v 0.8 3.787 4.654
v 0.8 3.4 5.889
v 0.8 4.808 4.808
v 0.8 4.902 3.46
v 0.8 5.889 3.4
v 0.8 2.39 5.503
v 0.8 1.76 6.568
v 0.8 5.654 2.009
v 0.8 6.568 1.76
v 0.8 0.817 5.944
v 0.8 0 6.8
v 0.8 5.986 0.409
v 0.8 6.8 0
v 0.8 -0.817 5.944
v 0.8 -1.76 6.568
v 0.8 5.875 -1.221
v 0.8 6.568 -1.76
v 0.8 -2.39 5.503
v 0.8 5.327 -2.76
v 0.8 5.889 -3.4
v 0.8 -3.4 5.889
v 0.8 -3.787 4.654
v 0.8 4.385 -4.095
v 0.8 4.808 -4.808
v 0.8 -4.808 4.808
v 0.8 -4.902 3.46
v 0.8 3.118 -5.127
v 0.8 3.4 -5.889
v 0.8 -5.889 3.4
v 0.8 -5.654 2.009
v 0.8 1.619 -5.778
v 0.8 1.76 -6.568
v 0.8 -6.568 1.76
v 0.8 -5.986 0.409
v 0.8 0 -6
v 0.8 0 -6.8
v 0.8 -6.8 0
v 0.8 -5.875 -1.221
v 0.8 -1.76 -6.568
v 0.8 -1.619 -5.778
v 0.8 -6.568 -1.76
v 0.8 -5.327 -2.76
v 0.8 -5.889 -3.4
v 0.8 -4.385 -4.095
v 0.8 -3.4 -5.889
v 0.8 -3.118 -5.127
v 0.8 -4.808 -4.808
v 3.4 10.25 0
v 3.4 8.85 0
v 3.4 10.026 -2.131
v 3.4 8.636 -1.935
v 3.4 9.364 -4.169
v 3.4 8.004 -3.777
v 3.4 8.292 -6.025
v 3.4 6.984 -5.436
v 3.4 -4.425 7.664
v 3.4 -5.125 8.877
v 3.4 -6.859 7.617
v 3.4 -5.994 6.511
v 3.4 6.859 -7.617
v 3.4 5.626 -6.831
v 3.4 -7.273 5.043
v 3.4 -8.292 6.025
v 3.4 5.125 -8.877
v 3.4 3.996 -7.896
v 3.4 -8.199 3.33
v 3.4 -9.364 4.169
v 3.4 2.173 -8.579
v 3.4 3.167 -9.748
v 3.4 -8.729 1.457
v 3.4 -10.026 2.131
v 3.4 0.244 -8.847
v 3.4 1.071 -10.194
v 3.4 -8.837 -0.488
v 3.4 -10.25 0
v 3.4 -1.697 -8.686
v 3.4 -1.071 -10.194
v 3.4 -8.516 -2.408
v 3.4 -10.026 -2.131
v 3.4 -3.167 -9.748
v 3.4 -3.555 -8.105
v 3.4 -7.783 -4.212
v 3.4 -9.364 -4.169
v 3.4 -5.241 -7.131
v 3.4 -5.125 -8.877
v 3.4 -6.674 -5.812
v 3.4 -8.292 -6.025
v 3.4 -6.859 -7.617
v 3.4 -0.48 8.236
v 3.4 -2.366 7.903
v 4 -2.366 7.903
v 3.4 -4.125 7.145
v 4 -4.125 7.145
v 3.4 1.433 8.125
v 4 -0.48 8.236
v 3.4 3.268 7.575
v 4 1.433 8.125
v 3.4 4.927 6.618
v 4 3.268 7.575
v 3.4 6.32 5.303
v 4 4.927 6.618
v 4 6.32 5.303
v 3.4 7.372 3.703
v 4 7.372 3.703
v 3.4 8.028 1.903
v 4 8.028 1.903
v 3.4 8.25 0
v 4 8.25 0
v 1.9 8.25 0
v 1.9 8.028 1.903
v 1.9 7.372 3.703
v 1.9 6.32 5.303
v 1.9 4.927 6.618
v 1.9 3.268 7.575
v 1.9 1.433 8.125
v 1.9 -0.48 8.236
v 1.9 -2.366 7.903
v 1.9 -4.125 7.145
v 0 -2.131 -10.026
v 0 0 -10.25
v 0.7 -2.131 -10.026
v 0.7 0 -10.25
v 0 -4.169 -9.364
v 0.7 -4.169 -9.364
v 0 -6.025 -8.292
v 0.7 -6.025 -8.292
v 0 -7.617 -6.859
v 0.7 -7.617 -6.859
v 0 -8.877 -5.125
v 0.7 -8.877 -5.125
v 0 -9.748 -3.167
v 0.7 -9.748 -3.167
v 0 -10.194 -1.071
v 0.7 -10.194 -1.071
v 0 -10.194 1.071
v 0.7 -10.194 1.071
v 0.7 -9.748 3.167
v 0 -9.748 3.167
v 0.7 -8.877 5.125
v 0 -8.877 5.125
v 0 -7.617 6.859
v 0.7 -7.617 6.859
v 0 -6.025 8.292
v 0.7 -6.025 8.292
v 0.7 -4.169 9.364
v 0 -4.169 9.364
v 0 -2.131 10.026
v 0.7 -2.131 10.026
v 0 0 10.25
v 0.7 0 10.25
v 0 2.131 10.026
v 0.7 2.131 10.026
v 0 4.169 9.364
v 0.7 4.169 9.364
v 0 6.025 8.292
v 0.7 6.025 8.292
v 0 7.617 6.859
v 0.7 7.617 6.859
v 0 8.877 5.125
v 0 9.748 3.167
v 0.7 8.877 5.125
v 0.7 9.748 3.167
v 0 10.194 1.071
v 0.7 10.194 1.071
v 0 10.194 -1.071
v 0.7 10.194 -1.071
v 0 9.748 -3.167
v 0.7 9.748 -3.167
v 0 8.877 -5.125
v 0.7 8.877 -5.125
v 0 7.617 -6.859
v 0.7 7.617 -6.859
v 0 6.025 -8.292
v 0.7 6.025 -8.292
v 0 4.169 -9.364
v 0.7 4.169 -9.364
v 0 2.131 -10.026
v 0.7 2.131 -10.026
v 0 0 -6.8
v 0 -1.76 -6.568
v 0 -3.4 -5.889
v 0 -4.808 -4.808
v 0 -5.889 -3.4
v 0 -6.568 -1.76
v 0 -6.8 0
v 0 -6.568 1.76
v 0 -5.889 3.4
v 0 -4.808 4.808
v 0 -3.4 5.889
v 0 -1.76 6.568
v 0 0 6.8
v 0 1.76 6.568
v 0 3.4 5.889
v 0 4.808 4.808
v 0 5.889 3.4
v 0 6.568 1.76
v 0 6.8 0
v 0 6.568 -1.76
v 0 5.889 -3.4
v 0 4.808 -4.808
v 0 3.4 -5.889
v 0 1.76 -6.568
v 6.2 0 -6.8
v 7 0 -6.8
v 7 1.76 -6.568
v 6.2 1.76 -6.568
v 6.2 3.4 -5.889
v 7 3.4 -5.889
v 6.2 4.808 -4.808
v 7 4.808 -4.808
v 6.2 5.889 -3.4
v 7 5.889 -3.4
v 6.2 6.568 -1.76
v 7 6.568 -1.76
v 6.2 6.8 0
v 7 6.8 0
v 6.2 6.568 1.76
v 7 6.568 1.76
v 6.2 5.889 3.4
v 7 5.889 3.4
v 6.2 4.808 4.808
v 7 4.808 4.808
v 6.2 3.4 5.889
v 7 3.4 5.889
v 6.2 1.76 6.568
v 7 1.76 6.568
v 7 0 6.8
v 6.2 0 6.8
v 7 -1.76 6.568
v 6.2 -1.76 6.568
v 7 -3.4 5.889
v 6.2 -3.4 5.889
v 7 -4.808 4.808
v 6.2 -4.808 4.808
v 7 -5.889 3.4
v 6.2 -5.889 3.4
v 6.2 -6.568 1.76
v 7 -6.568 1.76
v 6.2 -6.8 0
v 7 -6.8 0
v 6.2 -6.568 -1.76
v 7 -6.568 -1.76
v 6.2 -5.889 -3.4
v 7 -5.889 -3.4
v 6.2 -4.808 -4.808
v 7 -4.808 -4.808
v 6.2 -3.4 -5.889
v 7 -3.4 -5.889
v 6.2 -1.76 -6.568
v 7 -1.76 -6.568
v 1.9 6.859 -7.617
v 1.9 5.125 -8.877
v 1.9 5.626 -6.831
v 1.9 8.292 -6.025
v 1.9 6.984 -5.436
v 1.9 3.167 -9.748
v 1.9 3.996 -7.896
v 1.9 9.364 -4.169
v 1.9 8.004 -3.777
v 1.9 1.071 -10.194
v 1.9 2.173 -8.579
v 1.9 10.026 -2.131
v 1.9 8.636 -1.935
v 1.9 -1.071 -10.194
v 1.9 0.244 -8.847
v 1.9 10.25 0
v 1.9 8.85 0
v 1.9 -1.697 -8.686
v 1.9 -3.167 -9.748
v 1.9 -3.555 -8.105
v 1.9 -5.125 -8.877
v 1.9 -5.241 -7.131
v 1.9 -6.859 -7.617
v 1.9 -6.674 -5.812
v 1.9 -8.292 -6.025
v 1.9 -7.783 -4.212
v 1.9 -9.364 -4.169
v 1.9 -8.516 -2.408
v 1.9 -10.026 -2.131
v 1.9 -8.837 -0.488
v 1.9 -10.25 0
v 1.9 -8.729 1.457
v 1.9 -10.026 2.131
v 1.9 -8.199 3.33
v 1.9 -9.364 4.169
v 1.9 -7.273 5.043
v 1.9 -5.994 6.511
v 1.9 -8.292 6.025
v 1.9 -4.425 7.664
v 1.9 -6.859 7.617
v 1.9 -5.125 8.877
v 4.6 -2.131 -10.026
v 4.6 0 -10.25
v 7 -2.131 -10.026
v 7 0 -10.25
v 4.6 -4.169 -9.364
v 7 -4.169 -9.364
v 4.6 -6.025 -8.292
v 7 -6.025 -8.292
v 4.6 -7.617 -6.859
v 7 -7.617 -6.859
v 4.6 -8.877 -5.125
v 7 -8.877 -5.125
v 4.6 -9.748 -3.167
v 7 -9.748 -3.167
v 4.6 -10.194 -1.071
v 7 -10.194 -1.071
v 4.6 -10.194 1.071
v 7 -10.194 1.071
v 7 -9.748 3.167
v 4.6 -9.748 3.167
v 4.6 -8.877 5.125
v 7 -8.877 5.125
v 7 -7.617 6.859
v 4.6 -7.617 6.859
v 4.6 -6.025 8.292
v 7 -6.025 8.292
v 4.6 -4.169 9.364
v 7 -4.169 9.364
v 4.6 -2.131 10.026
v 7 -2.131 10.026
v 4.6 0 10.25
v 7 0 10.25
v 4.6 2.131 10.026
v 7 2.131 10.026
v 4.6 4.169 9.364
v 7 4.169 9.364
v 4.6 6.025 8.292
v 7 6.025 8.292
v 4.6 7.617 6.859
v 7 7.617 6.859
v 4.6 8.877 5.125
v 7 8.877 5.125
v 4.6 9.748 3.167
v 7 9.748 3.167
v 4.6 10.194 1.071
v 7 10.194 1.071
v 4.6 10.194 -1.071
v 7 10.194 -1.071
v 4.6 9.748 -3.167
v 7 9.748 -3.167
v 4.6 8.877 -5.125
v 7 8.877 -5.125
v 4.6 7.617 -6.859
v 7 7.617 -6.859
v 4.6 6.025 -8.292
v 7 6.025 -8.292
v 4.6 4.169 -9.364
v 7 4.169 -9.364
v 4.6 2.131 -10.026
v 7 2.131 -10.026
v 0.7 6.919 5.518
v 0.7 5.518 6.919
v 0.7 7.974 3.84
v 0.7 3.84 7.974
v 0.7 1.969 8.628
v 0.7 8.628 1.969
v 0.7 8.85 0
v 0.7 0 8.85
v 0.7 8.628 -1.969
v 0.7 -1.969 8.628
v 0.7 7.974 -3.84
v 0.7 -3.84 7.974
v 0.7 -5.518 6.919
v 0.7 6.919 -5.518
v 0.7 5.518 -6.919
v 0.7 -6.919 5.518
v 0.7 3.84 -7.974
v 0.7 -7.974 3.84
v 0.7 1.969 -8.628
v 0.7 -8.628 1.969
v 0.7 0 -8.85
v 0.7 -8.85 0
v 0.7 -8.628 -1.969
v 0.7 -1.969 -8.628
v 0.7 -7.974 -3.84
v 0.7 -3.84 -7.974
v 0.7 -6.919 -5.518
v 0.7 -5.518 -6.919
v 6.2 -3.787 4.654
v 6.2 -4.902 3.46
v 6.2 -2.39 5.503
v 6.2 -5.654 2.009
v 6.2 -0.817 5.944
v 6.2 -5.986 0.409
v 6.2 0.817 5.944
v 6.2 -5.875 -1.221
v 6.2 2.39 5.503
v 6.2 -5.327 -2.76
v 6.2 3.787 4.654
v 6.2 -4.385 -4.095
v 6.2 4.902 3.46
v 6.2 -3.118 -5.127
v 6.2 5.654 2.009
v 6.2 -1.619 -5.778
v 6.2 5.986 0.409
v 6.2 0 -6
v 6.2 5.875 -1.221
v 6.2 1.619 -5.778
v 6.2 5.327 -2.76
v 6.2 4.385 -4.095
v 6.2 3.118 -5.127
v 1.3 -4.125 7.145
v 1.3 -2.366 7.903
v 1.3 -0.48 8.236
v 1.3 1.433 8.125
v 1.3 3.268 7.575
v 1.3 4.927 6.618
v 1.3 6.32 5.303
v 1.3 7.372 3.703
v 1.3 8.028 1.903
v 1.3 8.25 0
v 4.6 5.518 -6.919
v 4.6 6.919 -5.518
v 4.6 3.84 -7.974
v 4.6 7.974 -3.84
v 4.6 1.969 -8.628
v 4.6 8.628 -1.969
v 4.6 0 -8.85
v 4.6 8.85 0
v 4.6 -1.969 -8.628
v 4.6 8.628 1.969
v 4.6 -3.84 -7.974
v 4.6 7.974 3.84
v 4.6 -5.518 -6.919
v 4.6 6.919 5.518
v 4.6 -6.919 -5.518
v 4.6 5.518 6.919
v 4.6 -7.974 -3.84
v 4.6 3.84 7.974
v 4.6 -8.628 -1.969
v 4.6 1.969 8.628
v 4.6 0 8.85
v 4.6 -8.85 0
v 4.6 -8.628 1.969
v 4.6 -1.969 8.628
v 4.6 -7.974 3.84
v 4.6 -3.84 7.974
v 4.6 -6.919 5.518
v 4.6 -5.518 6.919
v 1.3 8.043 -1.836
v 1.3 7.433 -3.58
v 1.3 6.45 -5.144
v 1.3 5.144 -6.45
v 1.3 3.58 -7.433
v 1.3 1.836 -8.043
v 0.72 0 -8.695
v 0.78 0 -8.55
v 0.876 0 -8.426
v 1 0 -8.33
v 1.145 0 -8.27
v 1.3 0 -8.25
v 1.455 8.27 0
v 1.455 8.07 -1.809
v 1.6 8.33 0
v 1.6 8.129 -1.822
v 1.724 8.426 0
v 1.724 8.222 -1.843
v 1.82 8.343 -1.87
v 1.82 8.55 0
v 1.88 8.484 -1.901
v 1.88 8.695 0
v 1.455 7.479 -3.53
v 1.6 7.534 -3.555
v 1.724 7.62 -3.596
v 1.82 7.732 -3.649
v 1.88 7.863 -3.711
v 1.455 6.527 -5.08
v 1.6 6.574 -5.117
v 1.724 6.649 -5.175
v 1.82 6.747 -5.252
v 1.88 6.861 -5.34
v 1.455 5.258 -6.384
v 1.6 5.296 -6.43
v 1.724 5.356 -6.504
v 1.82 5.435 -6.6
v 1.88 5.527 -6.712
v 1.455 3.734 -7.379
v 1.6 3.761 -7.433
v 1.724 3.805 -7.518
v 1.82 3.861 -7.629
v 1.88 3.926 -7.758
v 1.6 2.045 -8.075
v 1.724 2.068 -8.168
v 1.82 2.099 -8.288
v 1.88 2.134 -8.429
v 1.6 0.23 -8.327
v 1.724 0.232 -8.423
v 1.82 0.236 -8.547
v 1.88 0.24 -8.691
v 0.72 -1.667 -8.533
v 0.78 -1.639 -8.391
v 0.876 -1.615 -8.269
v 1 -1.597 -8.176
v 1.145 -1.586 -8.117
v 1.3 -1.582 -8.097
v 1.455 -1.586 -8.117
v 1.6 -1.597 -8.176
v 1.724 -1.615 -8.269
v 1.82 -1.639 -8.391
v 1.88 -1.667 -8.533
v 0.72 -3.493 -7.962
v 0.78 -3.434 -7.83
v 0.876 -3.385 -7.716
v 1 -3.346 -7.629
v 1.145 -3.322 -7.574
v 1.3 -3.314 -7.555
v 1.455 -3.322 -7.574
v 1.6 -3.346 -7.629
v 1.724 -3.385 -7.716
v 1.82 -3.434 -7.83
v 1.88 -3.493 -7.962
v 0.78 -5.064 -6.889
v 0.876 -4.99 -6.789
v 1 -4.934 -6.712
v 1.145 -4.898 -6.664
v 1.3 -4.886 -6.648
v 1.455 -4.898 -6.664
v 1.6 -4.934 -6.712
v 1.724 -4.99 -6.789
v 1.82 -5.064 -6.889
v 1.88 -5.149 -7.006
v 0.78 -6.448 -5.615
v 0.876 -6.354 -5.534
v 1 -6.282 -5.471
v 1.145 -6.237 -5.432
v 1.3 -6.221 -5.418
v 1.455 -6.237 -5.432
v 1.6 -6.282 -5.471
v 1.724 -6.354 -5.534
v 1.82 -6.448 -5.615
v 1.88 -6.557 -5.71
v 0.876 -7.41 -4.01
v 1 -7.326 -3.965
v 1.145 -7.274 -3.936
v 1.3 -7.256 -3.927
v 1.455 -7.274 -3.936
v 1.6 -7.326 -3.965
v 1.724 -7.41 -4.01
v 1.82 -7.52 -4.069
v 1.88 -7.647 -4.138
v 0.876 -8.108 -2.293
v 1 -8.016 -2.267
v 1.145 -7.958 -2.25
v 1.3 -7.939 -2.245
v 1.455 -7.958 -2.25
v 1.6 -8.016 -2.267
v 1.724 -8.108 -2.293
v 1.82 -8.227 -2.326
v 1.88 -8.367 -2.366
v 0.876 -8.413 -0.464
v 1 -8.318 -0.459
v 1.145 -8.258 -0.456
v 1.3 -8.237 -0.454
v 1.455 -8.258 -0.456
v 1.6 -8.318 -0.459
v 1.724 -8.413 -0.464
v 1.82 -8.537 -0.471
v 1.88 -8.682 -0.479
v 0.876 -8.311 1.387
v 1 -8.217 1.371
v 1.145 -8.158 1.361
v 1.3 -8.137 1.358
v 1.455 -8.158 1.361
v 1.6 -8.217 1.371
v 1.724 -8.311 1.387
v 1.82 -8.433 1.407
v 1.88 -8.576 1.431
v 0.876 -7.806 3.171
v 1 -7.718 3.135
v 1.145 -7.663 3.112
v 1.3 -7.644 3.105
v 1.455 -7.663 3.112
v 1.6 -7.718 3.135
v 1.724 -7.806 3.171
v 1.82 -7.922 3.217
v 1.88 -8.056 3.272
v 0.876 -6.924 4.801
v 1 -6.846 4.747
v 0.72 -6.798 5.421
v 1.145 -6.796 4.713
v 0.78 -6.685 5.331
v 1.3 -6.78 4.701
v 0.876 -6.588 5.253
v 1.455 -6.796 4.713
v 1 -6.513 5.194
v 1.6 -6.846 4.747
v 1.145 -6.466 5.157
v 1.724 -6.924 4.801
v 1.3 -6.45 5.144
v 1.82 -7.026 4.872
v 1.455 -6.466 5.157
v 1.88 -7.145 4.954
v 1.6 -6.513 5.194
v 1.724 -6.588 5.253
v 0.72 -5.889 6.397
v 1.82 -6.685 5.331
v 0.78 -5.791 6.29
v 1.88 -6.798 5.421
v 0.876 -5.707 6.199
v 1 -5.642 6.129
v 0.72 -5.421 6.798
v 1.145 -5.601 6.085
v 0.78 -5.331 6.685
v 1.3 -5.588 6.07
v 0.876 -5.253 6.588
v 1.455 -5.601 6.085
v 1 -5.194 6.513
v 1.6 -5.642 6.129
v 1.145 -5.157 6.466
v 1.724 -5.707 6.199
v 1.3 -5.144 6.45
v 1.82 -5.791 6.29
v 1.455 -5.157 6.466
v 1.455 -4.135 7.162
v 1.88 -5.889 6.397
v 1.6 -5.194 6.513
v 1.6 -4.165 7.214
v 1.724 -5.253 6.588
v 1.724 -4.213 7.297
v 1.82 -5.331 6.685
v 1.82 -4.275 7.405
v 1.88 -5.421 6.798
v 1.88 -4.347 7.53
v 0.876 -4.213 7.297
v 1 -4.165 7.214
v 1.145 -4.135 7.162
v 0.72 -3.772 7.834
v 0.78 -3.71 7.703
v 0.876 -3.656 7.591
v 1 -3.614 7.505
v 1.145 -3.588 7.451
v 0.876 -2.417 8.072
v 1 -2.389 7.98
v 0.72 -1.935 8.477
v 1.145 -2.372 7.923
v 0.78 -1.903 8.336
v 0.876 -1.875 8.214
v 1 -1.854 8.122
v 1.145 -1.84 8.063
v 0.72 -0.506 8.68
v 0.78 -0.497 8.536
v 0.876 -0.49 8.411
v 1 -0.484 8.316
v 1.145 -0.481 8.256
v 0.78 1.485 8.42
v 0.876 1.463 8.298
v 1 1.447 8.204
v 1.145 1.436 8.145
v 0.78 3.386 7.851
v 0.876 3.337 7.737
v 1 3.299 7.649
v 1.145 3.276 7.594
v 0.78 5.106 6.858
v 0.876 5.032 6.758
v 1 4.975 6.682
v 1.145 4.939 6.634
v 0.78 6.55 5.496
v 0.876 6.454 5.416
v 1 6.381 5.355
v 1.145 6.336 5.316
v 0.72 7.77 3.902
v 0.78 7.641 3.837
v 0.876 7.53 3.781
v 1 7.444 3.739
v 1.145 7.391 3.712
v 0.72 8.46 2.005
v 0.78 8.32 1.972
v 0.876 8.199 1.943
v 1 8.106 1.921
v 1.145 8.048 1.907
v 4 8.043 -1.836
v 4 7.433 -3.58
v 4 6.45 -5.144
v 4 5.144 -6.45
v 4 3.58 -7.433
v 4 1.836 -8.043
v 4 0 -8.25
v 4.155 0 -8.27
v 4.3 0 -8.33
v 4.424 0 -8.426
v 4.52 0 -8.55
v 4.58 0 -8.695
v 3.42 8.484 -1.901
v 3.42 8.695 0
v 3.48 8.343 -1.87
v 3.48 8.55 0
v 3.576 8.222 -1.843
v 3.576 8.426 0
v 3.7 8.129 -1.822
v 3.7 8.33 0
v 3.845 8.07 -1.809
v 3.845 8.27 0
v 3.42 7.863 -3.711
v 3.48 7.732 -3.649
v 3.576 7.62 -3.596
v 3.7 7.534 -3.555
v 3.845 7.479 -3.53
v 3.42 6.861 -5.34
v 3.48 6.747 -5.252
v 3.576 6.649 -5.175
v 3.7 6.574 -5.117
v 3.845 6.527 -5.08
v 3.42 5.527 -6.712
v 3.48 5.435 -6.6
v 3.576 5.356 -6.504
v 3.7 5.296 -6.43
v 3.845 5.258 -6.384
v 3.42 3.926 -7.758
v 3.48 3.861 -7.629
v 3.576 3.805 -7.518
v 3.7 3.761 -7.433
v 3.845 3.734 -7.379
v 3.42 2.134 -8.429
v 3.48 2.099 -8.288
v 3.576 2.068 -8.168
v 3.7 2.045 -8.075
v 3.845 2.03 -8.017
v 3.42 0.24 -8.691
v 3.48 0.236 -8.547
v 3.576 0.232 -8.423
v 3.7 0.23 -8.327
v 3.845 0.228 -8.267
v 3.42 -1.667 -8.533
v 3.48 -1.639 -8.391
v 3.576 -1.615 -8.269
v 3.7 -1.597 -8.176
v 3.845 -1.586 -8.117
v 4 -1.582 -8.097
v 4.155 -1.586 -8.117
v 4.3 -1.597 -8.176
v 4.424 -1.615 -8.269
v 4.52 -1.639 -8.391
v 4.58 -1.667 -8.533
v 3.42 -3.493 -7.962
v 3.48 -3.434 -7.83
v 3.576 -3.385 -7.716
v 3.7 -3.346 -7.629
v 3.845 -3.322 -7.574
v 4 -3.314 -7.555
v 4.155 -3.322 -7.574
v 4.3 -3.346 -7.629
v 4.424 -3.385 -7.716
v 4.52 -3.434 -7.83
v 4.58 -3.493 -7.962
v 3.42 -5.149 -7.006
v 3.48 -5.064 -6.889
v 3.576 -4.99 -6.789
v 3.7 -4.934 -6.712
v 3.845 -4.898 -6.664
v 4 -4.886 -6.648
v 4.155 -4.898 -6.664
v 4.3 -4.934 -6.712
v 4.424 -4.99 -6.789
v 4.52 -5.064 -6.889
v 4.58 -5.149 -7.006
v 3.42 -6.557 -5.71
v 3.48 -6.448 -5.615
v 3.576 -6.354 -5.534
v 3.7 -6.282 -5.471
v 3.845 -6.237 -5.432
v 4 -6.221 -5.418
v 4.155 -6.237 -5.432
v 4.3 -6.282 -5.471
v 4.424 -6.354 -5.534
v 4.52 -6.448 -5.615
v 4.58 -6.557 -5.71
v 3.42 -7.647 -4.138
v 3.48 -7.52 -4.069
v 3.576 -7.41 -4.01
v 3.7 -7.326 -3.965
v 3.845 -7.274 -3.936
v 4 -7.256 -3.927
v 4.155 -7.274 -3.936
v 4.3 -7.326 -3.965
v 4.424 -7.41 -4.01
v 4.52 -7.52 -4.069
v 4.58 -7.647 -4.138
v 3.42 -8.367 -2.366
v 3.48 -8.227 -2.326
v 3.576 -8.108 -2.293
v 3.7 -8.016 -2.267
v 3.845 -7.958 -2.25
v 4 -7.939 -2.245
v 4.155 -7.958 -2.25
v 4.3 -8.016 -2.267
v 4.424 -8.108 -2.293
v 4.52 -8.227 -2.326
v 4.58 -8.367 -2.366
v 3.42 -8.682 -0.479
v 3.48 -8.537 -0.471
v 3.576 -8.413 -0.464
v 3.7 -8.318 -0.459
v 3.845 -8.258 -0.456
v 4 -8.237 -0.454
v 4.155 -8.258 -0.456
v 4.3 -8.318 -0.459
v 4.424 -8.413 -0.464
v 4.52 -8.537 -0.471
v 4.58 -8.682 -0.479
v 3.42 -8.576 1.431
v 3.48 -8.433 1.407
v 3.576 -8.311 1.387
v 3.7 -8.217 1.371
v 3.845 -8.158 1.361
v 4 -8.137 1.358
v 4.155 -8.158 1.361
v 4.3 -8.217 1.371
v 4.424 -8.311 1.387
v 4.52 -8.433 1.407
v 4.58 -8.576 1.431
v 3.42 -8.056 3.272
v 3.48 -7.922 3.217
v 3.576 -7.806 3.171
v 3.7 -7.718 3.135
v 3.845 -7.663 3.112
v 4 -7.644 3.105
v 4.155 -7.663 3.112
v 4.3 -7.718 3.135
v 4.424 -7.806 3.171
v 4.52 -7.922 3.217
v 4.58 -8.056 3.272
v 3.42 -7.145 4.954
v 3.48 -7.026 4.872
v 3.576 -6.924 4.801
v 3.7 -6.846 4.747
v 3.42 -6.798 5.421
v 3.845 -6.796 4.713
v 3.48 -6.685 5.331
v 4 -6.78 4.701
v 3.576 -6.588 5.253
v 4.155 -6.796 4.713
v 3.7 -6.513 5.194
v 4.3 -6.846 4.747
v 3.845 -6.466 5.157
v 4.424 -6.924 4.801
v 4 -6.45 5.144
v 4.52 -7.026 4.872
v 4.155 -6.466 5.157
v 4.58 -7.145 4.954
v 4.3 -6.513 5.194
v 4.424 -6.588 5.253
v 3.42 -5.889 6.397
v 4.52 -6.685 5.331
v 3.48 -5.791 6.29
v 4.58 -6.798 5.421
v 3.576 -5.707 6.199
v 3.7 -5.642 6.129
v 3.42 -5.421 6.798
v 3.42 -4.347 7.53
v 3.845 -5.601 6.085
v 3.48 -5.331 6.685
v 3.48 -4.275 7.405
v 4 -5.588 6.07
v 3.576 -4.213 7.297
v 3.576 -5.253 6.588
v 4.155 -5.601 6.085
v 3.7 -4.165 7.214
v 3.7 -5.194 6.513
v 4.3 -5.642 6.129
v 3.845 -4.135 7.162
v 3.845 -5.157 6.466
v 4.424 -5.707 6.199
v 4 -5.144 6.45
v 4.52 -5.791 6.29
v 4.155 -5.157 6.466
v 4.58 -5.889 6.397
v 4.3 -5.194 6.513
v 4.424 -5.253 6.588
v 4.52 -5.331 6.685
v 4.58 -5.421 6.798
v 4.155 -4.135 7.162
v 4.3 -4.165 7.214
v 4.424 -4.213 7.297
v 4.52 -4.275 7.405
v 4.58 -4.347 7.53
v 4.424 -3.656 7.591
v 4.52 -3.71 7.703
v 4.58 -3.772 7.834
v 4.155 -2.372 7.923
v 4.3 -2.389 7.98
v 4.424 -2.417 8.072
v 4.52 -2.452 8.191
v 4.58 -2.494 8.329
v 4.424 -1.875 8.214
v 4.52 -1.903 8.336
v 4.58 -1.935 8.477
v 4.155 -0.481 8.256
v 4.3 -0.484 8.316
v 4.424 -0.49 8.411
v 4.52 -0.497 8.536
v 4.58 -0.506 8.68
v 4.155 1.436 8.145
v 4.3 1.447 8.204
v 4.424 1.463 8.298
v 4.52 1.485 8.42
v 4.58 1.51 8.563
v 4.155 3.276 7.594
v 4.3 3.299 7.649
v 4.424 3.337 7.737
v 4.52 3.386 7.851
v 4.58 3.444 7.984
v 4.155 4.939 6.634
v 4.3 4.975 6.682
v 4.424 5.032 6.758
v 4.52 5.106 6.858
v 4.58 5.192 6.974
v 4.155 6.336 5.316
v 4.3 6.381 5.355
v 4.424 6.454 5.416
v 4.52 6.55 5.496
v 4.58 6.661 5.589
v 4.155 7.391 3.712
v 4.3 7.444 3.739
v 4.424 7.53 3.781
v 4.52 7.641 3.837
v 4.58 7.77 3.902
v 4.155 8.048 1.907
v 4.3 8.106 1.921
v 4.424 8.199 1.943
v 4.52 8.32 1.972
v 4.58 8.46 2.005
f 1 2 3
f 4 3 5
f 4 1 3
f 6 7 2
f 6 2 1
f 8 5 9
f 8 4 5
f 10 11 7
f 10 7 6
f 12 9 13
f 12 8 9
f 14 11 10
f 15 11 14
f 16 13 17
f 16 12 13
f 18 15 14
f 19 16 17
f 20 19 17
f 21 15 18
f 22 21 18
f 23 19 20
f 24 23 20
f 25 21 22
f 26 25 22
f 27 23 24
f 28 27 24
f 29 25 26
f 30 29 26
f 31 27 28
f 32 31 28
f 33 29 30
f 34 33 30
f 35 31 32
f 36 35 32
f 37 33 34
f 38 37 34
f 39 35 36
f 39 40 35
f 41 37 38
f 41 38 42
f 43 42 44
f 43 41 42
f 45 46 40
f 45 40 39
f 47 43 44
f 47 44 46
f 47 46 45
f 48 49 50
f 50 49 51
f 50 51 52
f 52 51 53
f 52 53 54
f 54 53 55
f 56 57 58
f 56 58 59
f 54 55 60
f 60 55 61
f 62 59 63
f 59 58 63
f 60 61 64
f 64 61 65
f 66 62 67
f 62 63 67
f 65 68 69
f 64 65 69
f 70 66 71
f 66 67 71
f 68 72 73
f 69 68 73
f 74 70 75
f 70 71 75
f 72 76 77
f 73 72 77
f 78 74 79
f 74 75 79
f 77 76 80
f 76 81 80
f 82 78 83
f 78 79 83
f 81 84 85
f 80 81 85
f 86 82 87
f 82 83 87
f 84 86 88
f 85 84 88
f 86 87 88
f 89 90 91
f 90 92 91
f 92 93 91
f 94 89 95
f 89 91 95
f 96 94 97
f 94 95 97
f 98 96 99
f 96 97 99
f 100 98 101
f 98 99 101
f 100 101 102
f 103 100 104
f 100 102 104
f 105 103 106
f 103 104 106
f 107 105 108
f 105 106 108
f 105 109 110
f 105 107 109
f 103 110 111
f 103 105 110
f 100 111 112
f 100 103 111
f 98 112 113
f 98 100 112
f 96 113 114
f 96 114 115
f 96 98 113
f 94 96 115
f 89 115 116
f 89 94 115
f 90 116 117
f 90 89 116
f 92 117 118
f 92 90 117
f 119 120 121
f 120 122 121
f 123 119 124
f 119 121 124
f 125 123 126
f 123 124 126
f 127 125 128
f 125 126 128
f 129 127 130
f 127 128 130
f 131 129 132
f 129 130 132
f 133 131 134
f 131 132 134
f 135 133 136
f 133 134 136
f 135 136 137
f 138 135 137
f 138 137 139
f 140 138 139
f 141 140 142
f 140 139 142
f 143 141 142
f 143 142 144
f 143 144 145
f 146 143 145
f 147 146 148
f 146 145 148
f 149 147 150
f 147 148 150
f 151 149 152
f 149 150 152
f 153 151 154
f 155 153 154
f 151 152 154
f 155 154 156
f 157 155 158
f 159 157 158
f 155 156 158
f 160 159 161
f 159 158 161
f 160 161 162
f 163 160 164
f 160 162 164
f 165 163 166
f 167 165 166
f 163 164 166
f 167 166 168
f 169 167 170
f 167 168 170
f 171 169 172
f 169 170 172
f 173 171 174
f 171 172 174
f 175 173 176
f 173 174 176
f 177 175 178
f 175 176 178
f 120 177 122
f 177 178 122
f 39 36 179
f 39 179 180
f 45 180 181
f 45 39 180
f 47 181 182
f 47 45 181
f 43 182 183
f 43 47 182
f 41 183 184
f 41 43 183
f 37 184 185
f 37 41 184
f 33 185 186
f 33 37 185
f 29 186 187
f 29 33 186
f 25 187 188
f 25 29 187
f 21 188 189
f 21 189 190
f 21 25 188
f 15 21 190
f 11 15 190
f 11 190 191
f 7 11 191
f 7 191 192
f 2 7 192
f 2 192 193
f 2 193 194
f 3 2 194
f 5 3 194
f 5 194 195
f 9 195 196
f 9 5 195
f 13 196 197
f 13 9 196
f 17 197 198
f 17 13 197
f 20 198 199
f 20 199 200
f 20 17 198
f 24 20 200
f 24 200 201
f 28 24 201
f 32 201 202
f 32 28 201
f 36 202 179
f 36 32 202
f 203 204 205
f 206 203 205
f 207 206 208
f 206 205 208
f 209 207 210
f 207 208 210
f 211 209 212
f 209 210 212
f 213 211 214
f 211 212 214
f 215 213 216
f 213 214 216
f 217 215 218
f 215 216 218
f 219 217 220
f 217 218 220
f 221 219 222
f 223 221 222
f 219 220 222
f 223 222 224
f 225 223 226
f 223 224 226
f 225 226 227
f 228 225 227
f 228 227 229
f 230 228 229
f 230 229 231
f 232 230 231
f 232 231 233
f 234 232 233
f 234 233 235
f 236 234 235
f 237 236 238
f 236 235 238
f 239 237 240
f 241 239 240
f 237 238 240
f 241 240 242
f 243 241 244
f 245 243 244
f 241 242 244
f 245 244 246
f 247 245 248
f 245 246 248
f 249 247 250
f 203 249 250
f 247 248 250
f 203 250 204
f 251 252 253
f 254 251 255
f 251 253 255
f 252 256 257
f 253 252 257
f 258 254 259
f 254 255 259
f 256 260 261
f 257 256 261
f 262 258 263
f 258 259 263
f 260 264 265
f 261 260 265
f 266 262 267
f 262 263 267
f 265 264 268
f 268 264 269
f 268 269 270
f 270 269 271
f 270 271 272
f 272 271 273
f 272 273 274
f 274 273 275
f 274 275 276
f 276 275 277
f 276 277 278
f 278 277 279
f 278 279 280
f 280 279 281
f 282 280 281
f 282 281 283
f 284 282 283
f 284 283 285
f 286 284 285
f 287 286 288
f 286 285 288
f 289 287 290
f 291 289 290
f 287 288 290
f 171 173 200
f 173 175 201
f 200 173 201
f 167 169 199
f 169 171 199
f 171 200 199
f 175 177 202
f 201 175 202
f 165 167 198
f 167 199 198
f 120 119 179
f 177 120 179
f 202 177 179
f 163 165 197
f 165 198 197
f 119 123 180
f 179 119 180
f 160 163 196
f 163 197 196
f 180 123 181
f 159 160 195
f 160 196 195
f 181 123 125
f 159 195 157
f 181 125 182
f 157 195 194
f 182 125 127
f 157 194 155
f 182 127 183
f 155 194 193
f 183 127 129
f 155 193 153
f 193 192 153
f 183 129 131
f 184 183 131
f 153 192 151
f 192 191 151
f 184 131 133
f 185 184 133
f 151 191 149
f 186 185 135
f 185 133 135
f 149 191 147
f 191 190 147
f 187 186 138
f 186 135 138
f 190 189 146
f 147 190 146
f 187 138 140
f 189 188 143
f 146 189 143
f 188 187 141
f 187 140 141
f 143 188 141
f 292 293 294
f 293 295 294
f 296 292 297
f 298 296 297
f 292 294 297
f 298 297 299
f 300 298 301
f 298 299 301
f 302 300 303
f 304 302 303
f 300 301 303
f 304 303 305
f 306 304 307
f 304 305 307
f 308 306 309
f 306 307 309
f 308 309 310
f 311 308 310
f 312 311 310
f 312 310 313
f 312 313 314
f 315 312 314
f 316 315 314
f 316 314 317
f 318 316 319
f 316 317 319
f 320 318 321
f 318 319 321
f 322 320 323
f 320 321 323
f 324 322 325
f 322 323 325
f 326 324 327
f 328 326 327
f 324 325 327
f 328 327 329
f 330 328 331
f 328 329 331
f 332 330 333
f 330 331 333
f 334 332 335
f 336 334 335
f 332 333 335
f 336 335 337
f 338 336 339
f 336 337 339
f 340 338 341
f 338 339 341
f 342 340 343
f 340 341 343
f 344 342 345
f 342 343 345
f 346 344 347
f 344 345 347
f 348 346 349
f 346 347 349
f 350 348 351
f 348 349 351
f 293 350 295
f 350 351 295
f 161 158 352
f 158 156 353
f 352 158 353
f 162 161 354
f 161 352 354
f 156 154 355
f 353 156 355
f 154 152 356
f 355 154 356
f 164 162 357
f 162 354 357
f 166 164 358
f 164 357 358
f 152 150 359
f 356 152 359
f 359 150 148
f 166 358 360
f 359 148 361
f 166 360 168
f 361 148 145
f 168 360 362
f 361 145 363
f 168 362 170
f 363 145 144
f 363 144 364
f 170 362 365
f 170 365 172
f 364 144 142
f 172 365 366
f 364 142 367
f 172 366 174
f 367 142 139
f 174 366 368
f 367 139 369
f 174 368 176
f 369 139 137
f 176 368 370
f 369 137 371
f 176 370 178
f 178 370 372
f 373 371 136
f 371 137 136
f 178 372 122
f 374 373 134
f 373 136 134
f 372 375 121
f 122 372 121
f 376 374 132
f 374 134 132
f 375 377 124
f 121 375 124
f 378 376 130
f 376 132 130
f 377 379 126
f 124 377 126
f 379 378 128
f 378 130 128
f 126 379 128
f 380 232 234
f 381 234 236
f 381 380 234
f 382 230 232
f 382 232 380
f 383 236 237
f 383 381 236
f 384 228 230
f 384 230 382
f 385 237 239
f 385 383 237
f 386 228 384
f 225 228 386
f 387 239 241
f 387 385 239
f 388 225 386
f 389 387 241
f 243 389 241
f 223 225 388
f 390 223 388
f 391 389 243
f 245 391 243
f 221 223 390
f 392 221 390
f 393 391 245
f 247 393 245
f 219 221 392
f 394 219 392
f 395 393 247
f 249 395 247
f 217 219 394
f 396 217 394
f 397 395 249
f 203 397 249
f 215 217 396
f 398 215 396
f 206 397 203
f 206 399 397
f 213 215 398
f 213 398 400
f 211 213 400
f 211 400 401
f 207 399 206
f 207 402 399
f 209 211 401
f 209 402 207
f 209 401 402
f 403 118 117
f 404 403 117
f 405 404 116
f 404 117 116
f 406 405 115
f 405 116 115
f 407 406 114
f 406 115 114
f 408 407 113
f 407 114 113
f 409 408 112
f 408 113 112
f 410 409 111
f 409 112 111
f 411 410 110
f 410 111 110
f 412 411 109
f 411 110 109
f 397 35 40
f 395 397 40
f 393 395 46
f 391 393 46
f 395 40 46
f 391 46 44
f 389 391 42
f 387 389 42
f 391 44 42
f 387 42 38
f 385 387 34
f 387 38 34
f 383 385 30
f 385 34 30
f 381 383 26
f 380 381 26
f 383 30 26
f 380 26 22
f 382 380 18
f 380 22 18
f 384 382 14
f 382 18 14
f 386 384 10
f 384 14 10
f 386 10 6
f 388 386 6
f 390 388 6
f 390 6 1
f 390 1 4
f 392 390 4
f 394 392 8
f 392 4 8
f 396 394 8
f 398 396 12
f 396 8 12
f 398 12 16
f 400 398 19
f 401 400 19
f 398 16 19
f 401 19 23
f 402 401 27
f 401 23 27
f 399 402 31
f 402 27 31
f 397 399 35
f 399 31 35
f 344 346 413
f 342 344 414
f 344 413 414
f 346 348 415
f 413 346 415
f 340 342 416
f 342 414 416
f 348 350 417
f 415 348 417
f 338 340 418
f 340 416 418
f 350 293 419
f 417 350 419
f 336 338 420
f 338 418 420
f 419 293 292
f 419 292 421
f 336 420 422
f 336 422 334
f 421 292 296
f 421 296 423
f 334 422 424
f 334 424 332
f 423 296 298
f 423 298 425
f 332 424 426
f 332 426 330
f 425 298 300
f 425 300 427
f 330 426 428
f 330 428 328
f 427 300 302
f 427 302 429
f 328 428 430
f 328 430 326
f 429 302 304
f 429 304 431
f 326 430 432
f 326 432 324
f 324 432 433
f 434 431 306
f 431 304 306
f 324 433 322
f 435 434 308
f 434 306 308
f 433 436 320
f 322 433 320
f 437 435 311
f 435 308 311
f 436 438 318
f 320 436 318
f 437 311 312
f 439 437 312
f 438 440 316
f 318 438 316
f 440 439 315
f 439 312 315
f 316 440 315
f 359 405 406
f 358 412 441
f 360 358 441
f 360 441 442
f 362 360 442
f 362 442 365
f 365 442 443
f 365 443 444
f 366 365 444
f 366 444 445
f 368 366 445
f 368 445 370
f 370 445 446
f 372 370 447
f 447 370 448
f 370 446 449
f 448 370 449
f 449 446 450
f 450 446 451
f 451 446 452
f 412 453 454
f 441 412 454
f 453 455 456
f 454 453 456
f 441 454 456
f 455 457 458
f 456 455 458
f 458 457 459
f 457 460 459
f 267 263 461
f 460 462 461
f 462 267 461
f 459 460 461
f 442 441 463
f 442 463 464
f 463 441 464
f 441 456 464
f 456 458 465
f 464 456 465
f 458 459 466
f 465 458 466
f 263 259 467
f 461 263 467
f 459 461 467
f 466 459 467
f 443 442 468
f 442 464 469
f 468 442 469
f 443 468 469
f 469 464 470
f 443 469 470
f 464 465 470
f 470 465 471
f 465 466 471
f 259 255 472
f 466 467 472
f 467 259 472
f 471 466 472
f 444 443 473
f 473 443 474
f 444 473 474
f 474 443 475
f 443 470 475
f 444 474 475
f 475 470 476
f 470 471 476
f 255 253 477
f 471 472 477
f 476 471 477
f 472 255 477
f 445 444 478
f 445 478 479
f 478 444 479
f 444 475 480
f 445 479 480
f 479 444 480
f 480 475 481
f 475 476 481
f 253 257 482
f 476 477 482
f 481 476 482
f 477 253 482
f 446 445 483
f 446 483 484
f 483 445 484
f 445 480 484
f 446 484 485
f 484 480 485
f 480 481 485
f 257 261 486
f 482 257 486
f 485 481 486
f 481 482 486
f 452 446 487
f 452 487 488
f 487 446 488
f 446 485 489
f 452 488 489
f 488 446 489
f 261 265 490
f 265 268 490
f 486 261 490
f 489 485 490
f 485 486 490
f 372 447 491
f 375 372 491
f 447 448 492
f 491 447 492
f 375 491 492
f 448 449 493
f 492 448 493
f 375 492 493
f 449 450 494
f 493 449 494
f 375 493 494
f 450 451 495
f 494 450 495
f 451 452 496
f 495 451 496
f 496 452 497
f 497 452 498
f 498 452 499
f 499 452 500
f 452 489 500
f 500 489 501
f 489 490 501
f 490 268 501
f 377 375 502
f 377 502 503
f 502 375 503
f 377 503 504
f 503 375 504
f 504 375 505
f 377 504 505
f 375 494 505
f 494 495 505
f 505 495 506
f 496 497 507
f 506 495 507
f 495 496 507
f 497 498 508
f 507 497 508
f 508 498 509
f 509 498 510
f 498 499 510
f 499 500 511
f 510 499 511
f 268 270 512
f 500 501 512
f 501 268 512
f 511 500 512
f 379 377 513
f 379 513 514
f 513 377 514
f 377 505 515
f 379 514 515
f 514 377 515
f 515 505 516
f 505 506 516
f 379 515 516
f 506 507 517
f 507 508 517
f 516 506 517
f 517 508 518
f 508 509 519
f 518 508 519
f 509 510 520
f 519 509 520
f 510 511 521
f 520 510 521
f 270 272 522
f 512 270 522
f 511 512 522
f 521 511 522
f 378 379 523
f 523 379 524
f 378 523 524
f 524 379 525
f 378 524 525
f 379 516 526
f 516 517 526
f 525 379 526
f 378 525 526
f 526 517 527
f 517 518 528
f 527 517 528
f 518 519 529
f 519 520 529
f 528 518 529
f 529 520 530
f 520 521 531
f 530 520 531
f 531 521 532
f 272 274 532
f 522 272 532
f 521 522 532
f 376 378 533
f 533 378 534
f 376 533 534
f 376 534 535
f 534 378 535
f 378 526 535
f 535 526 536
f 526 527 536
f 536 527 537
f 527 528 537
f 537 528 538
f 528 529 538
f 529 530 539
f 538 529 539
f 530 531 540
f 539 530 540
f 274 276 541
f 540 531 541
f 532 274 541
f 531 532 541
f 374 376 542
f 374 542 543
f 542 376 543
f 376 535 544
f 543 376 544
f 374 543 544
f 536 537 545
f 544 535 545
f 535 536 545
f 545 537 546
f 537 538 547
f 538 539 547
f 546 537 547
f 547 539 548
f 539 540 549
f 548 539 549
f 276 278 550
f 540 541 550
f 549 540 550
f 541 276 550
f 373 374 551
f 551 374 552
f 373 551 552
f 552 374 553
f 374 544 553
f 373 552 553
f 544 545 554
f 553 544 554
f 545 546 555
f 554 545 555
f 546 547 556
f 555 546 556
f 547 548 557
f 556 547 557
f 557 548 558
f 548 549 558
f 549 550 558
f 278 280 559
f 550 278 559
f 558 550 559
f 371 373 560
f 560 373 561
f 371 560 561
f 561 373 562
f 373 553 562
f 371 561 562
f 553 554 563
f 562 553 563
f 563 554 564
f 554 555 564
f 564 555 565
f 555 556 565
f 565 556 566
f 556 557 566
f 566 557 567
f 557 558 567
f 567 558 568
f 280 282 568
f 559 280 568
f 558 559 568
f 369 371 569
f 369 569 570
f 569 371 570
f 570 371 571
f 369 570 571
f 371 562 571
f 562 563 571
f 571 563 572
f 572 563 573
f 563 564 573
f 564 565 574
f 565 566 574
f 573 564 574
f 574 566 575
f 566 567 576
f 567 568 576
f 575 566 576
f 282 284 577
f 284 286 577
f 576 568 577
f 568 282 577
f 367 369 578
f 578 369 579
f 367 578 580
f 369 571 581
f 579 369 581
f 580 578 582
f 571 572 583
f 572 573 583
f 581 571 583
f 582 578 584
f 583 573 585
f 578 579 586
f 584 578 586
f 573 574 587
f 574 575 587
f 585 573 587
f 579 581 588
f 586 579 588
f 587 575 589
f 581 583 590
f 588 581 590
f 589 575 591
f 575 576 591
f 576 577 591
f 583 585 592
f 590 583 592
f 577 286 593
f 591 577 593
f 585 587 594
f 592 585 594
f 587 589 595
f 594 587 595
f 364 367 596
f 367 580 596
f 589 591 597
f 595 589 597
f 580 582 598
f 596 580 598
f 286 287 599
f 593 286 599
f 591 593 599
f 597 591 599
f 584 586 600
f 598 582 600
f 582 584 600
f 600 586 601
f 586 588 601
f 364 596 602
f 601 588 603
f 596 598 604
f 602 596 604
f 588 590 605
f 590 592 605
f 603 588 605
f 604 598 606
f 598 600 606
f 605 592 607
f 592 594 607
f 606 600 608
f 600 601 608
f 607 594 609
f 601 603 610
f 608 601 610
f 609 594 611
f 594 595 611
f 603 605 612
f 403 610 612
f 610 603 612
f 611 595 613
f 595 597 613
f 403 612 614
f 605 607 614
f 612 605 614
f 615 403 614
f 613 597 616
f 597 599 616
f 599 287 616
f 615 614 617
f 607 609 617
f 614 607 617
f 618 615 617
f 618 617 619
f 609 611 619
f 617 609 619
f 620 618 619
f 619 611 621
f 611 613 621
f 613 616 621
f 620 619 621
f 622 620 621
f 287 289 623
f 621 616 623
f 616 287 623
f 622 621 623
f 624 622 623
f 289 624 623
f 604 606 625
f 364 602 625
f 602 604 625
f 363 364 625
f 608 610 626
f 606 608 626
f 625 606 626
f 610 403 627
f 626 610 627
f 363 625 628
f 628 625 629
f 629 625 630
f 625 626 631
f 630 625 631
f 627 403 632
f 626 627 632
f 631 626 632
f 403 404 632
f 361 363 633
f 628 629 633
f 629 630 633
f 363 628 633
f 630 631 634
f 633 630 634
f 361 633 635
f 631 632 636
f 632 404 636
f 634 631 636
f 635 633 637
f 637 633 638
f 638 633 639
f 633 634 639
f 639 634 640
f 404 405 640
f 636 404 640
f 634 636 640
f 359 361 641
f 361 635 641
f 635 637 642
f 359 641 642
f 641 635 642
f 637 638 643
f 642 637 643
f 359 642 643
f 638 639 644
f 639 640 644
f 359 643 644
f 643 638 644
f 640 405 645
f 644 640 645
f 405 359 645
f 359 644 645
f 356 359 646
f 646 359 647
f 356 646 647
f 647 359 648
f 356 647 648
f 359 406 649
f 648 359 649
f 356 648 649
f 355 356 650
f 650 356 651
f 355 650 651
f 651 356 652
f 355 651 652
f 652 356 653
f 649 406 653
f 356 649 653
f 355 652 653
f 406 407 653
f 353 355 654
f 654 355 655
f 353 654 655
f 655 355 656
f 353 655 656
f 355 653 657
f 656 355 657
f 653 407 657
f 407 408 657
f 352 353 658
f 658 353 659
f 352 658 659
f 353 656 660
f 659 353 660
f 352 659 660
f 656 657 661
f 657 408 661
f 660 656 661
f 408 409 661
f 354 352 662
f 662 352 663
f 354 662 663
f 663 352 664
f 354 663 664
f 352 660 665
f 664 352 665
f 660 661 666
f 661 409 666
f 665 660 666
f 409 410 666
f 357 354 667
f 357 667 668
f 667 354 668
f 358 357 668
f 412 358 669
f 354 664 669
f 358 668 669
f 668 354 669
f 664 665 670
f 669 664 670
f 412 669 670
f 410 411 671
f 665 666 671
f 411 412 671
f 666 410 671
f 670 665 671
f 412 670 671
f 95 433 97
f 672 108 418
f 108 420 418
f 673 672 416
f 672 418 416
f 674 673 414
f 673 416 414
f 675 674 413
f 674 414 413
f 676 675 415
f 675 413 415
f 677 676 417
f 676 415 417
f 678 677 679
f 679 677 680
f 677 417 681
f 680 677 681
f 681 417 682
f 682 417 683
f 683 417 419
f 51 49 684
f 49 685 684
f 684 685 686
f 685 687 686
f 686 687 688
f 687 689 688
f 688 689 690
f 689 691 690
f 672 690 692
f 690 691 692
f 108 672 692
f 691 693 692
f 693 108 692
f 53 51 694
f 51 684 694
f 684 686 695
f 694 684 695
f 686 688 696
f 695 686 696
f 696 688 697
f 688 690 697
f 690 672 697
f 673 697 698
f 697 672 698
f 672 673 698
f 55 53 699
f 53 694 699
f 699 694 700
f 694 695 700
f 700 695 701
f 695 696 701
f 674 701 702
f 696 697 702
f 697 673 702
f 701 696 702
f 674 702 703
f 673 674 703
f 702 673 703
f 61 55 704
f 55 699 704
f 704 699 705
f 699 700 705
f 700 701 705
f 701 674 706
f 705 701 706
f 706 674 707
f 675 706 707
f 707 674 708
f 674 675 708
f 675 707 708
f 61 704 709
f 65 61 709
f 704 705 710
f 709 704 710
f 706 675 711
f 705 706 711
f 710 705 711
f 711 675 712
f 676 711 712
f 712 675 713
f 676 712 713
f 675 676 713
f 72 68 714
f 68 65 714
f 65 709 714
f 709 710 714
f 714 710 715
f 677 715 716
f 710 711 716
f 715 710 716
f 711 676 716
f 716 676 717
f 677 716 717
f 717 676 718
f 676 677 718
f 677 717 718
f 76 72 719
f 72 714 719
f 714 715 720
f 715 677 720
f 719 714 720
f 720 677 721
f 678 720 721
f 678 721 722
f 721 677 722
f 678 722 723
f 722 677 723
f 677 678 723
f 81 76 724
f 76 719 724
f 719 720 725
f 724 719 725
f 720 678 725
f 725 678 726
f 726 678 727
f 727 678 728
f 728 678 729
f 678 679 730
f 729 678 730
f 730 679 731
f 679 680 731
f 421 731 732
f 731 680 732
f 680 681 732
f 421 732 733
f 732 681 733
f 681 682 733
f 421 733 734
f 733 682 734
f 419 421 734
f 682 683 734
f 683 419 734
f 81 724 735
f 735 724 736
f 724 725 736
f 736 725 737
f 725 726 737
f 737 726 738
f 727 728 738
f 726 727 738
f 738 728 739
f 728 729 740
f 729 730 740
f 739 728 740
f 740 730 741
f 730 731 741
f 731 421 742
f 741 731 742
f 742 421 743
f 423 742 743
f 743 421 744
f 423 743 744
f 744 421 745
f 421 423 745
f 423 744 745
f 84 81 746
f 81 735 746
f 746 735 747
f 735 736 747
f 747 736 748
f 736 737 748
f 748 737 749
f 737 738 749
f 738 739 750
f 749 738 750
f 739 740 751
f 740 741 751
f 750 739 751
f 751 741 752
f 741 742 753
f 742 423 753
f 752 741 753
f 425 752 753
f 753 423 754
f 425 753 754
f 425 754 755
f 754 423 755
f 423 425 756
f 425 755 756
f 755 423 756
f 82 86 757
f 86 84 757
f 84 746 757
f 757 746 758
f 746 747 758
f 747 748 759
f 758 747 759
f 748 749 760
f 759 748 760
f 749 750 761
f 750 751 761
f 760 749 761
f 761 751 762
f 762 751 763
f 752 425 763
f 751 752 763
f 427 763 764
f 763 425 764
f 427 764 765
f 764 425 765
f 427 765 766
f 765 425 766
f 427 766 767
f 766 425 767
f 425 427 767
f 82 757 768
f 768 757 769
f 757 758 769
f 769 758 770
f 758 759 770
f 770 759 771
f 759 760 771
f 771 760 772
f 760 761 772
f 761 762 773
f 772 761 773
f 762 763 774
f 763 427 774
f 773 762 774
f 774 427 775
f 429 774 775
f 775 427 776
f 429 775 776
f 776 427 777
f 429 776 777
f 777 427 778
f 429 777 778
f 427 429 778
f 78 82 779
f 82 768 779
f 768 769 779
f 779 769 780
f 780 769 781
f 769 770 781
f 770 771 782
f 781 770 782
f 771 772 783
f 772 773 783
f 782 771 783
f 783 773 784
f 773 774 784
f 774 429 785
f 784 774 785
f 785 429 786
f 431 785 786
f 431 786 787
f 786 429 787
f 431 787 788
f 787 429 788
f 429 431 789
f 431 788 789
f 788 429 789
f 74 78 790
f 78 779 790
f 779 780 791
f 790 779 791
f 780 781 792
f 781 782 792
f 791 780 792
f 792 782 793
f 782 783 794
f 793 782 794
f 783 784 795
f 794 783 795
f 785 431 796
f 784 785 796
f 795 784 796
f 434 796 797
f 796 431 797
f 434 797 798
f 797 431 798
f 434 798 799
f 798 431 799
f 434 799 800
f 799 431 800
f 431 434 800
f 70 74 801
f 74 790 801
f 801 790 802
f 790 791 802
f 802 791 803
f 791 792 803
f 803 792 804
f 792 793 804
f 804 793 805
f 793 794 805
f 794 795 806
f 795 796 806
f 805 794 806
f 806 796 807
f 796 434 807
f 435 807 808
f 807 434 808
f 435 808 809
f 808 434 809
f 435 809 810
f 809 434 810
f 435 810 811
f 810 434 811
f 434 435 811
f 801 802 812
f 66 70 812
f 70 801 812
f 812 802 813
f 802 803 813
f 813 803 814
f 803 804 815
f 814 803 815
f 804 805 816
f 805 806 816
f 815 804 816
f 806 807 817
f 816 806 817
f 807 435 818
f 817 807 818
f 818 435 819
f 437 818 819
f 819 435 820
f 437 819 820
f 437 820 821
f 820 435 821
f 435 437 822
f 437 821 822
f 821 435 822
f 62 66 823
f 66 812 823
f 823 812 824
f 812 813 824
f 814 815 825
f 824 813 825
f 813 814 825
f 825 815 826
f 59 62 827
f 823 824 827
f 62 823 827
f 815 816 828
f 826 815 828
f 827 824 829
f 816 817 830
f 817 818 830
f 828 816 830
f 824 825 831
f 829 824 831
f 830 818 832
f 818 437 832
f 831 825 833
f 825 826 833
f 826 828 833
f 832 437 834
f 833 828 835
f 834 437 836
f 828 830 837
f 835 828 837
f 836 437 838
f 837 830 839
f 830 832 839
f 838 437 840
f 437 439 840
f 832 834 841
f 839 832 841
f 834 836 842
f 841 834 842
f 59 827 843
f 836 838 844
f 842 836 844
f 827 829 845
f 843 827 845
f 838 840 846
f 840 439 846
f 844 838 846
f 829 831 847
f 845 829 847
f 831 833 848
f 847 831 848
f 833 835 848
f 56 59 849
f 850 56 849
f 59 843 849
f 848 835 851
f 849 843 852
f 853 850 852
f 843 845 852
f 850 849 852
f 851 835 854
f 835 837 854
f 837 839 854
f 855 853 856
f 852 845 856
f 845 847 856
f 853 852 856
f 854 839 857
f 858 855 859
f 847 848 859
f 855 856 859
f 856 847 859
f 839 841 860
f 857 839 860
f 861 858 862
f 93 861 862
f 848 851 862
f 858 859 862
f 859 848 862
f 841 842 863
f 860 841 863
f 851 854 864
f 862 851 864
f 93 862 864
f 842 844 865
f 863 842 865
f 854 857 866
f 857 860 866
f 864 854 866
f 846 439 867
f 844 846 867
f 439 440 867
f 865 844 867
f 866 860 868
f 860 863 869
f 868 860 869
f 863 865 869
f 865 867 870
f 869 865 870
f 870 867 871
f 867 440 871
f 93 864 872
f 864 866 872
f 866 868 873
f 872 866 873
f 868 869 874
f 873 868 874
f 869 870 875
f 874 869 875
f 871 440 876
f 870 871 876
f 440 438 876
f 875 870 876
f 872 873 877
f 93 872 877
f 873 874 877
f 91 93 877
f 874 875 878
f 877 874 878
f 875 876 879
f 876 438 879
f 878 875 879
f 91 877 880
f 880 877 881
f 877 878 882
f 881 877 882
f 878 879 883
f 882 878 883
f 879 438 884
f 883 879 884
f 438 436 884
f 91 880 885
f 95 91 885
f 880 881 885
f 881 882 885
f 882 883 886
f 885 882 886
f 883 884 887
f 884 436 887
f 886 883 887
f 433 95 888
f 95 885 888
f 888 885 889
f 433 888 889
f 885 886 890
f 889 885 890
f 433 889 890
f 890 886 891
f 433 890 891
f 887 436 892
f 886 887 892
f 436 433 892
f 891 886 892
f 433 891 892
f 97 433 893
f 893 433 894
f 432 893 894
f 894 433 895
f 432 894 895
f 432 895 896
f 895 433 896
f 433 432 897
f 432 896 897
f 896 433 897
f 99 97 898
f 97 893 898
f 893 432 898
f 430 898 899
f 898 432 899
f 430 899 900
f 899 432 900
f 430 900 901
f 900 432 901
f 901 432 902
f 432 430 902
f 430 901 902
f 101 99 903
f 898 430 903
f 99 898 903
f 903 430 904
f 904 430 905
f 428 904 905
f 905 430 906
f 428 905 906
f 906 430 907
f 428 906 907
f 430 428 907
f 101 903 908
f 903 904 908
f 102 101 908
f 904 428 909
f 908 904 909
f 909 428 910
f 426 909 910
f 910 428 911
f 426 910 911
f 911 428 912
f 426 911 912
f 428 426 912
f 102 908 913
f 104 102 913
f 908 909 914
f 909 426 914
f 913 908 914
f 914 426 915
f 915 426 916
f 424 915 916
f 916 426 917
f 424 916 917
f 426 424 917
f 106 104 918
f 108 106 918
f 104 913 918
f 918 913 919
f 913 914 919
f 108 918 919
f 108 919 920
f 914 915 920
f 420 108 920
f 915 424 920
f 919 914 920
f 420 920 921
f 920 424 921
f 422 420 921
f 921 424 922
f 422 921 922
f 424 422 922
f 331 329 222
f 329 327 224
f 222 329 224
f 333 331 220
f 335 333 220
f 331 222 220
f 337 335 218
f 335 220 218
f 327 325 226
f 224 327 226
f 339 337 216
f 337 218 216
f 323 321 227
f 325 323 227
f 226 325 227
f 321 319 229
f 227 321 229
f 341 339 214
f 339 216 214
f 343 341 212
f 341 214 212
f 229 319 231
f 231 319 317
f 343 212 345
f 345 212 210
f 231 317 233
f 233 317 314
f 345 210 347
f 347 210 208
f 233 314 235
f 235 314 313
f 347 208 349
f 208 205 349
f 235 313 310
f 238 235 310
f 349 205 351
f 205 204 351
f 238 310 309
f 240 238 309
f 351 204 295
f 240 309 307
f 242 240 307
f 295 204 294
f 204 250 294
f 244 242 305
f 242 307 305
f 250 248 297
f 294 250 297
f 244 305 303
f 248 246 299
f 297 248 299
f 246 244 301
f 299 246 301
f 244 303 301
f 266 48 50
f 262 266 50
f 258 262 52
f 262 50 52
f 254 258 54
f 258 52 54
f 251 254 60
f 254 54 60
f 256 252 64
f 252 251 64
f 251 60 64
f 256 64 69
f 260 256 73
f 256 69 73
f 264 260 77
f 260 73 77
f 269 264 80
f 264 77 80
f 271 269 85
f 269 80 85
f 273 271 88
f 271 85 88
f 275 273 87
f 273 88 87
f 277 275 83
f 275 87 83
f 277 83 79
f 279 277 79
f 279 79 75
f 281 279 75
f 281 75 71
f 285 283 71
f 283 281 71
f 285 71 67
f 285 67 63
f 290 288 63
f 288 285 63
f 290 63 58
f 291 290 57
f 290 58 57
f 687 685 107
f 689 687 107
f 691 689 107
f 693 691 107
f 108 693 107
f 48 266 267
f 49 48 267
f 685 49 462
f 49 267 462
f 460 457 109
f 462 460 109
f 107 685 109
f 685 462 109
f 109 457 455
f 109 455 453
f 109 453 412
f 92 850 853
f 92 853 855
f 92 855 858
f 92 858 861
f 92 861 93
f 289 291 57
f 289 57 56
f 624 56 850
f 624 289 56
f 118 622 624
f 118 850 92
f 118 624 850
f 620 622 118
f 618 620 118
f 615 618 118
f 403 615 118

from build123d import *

# Parameters (mm, degrees)
SKETCH8_W          = 1.5
SKETCH8_H          = 2
CUT_REVOLVE1_ANGLE = 120
FILLET1_R          = 0.6
SKETCH3_R          = 6.8
CUT_EXTRUDE1_DEPTH = 0.8
CUT_EXTRUDE2_START = -0.8
SKETCH4_R          = 6.8
CUT_EXTRUDE2_DEPTH = 0.8


with BuildPart() as part:
    # Sketch2 → Revolve1 (revolve)
    with BuildSketch(Plane(origin=(0, 0, 0), x_dir=(1, 0, 0), z_dir=(0, 1, 0))):
        Polygon((7, 10.25), (7, 6), (0, 6), (0, 10.25), (0.7, 10.25), (0.7, 8.25), (1.9, 8.25), (1.9, 10.25), (3.4, 10.25), (3.4, 8.25), (4.6, 8.25), (4.6, 10.25), align=None)
    revolve(axis=Axis((7, 0, 0), (-1, 0, 0)))

    # Sketch8 → Cut-Revolve1 (revolve, cut)
    with BuildSketch(Plane.XY):
        with Locations((2.65, 9.25)):
            Rectangle(SKETCH8_W, SKETCH8_H)
    revolve(axis=Axis((0, 0, 0), (1, 0, 0)), revolution_arc=CUT_REVOLVE1_ANGLE, mode=Mode.SUBTRACT)

    # Fillet1
    # the kernel refuses this fillet: 0.6 mm, written as the material it adds along each edge
    with BuildSketch(Plane(origin=(0.7, 0, 0), x_dir=(0, 0, -1), z_dir=(0, 1, 0))) as fillet1_piece_1:
        with BuildLine():
            CenterArc((8.25 + FILLET1_R, -FILLET1_R), FILLET1_R, 90, 90)
            Line((8.25, -FILLET1_R), (8.25, 0))
            Line((8.25, 0), (8.25 + FILLET1_R, 0))
        make_face()
    revolve(axis=Axis((0.7, 0, 0), (-1, 0, 0)))
    with BuildSketch(Plane(origin=(4.6, 0, 0), x_dir=(0, 0, -1), z_dir=(0, 1, 0))) as fillet1_piece_2:
        with BuildLine():
            CenterArc((8.25 + FILLET1_R, FILLET1_R), FILLET1_R, 180, 90)
            Line((8.25, FILLET1_R), (8.25, 0))
            Line((8.25, 0), (8.25 + FILLET1_R, 0))
        make_face()
    revolve(axis=Axis((4.6, 0, 0), (-1, 0, 0)))
    with BuildSketch(Plane(origin=(1.9, 0, 0), x_dir=(0, 0, -1), z_dir=(0, 1, 0))) as fillet1_piece_3:
        with BuildLine():
            CenterArc((8.25 + FILLET1_R, FILLET1_R), FILLET1_R, 180, 90)
            Line((8.25 + FILLET1_R, 0), (8.25, 0))
            Line((8.25, 0), (8.25, FILLET1_R))
        make_face()
    revolve(axis=Axis((1.9, 0, 0), (-1, 0, 0)), revolution_arc=150)
    with BuildSketch(Plane(origin=(3.4, 0, 0), x_dir=(0, 0, -1), z_dir=(0, 1, 0))) as fillet1_piece_4:
        with BuildLine():
            CenterArc((8.25 + FILLET1_R, -FILLET1_R), FILLET1_R, 90, 90)
            Line((8.25 + FILLET1_R, 0), (8.25, 0))
            Line((8.25, 0), (8.25, -FILLET1_R))
        make_face()
    revolve(axis=Axis((3.4, 0, 0), (-1, 0, 0)), revolution_arc=150)
    with BuildSketch(Plane(origin=(3.4, 0, 0), x_dir=(0, 1, 0), z_dir=(0, 0, 1))) as fillet1_piece_5:
        with BuildLine():
            CenterArc((8.25 + FILLET1_R, -FILLET1_R), FILLET1_R, 90, 90)
            Line((8.25 + FILLET1_R, 0), (8.25, 0))
            Line((8.25, 0), (8.25, -FILLET1_R))
        make_face()
    revolve(axis=Axis((3.4, 0, 0), (-1, 0, 0)), revolution_arc=90)
    with BuildSketch(Plane(origin=(1.9, 0, 0), x_dir=(0, 1, 0), z_dir=(0, 0, 1))) as fillet1_piece_6:
        with BuildLine():
            CenterArc((8.25 + FILLET1_R, FILLET1_R), FILLET1_R, 180, 90)
            Line((8.25 + FILLET1_R, 0), (8.25, 0))
            Line((8.25, 0), (8.25, FILLET1_R))
        make_face()
    revolve(axis=Axis((1.9, 0, 0), (-1, 0, 0)), revolution_arc=90)

    # Sketch3 → Cut-Extrude1 (cut)
    with BuildSketch(Plane(origin=(7, 0, 0), x_dir=(0, 0, -1), z_dir=(1, 0, 0))):
        Circle(SKETCH3_R)
    extrude(amount=-CUT_EXTRUDE1_DEPTH, mode=Mode.SUBTRACT)

    # Sketch4 → Cut-Extrude2 (cut)
    with BuildSketch(Plane.ZY.offset(CUT_EXTRUDE2_START)):
        with Locations(Location((0, 0, 0), (0, 0, 180))):
            Circle(SKETCH4_R)
    extrude(amount=CUT_EXTRUDE2_DEPTH, mode=Mode.SUBTRACT)


solid = part.part
